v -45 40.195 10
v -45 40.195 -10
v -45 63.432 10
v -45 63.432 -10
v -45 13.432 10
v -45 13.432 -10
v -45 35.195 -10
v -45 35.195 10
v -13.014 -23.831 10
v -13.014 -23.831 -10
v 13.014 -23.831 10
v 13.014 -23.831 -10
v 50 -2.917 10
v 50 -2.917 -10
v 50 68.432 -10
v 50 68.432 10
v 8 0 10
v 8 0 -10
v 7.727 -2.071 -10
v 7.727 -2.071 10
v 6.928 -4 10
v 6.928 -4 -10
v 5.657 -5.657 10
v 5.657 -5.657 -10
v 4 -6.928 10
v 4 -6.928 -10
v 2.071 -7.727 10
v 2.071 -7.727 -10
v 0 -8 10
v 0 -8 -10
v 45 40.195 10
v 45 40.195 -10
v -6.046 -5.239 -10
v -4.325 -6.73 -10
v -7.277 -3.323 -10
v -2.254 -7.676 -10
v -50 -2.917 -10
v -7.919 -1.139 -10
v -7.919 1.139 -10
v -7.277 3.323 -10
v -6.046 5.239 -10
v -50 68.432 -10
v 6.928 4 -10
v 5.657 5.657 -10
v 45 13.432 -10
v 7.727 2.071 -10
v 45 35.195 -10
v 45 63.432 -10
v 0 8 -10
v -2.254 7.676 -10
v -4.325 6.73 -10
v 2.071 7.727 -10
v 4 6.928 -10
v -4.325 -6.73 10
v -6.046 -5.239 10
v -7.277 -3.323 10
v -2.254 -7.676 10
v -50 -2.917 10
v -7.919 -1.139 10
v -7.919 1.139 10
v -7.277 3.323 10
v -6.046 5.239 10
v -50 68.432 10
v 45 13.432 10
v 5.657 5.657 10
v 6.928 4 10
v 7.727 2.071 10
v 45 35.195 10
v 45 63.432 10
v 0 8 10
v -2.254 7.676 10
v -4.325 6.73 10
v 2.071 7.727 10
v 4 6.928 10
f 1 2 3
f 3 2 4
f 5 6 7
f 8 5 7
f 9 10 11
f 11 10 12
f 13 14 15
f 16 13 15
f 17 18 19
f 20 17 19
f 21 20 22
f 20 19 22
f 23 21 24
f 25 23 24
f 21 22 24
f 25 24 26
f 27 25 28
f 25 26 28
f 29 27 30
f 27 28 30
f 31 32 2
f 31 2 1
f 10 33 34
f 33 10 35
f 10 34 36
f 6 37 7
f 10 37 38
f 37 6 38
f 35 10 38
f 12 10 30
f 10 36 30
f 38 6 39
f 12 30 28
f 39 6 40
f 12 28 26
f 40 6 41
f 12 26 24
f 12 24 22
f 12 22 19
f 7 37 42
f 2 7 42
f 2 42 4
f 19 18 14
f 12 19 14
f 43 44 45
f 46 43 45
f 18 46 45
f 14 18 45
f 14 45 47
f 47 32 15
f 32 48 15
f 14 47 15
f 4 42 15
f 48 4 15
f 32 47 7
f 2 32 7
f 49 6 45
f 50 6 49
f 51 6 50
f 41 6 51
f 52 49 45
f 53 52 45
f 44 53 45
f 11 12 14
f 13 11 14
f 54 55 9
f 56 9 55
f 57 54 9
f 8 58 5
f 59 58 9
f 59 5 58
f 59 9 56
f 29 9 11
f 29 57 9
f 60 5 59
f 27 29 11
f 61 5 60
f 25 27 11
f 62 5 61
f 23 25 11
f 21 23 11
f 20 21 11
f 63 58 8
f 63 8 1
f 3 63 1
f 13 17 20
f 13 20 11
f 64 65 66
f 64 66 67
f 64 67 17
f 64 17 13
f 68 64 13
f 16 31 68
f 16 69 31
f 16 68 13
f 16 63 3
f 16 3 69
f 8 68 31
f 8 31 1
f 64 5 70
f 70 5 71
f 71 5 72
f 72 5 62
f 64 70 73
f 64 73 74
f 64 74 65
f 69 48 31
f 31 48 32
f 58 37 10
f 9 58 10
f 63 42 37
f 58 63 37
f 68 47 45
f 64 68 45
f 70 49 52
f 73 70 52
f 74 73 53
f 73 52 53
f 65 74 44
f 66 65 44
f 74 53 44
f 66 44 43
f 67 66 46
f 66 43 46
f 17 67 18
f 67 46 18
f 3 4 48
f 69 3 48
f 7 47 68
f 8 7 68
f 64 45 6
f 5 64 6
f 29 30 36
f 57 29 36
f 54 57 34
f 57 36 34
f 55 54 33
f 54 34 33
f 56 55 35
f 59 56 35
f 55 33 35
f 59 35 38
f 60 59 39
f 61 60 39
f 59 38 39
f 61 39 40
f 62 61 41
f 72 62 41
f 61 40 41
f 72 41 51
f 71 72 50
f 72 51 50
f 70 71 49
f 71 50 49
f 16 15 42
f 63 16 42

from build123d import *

# Parameters (mm, degrees)
BOSS_EXTRUDE2_DEPTH      = 10
BOSS_EXTRUDE2_DEPTH_BACK = 10
EXTRUDE_THIN2_START      = -10
EXTRUDE_THIN2_DEPTH      = 20
SKETCH2_W                = 20
SKETCH2_H                = 2.5
BOSS_EXTRUDE3_DEPTH      = 90


# Read off the part's stored shape, not the designer's step: Extrude-Thin2
with BuildPart() as part:
    # Sketch1 → Boss-Extrude2 (new, two sides: drawn at the far end of the back side and taken through both)
    with BuildSketch(Plane.XY.offset(-BOSS_EXTRUDE2_DEPTH_BACK)):
        Polygon((-13.01396445, -23.830717844), (0, -23.830717844), (0, -18.830717844), (-11.698214449, -18.830717844), (-45, 0), (-45, 13.432214294), (-50, 13.432214294), (-50, -2.916716145), align=None)
        Polygon((0, -18.830717844), (0, -23.830717844), (13.01396445, -23.830717844), (50, -2.916716145), (50, 13.432214294), (45, 13.432214294), (45, 0), (11.698214449, -18.830717844), align=None)
        with BuildLine():
            Line((-11.698214449, -18.830717844), (0, -18.830717844))
            Line((0, -18.830717844), (0, -8))
            ThreePointArc((0, -8), (-8, 0), (0, 8))
            Line((0, 8), (0, 13.432214294))
            Line((0, 13.432214294), (-45, 13.432214294))
            Line((-45, 13.432214294), (-45, 0))
            Line((-45, 0), (-11.698214449, -18.830717844))
        make_face()
        with BuildLine():
            Line((0, -8), (0, -18.830717844))
            Line((0, -18.830717844), (11.698214449, -18.830717844))
            Line((11.698214449, -18.830717844), (45, 0))
            Line((45, 0), (45, 13.432214294))
            Line((45, 13.432214294), (0, 13.432214294))
            Line((0, 13.432214294), (0, 8))
            ThreePointArc((0, 8), (5.656854249, 5.656854249), (8, 0))
            ThreePointArc((8, 0), (5.656854249, -5.656854249), (0, -8))
        make_face()
    extrude(amount=BOSS_EXTRUDE2_DEPTH + BOSS_EXTRUDE2_DEPTH_BACK)

    # Extrude-Thin2 outline → Extrude-Thin2 (add)
    with BuildSketch(Plane.XY.offset(EXTRUDE_THIN2_START)):
        Polygon((45, 13.432214294), (50, 13.432214294), (50, 68.432214294), (-50, 68.432214294), (-50, 13.432214294), (-45, 13.432214294), (-45, 63.432214294), (45, 63.432214294), align=None)
    extrude(amount=EXTRUDE_THIN2_DEPTH)

    # Sketch2 → Boss-Extrude3 (add)
    with BuildSketch(Plane.ZY.offset(-45)):
        with Locations((0, 38.944873029)):
            Rectangle(SKETCH2_W, SKETCH2_H)
        with Locations((0, 36.444873029)):
            Rectangle(SKETCH2_W, SKETCH2_H)
    extrude(amount=BOSS_EXTRUDE3_DEPTH)


solid = part.part
